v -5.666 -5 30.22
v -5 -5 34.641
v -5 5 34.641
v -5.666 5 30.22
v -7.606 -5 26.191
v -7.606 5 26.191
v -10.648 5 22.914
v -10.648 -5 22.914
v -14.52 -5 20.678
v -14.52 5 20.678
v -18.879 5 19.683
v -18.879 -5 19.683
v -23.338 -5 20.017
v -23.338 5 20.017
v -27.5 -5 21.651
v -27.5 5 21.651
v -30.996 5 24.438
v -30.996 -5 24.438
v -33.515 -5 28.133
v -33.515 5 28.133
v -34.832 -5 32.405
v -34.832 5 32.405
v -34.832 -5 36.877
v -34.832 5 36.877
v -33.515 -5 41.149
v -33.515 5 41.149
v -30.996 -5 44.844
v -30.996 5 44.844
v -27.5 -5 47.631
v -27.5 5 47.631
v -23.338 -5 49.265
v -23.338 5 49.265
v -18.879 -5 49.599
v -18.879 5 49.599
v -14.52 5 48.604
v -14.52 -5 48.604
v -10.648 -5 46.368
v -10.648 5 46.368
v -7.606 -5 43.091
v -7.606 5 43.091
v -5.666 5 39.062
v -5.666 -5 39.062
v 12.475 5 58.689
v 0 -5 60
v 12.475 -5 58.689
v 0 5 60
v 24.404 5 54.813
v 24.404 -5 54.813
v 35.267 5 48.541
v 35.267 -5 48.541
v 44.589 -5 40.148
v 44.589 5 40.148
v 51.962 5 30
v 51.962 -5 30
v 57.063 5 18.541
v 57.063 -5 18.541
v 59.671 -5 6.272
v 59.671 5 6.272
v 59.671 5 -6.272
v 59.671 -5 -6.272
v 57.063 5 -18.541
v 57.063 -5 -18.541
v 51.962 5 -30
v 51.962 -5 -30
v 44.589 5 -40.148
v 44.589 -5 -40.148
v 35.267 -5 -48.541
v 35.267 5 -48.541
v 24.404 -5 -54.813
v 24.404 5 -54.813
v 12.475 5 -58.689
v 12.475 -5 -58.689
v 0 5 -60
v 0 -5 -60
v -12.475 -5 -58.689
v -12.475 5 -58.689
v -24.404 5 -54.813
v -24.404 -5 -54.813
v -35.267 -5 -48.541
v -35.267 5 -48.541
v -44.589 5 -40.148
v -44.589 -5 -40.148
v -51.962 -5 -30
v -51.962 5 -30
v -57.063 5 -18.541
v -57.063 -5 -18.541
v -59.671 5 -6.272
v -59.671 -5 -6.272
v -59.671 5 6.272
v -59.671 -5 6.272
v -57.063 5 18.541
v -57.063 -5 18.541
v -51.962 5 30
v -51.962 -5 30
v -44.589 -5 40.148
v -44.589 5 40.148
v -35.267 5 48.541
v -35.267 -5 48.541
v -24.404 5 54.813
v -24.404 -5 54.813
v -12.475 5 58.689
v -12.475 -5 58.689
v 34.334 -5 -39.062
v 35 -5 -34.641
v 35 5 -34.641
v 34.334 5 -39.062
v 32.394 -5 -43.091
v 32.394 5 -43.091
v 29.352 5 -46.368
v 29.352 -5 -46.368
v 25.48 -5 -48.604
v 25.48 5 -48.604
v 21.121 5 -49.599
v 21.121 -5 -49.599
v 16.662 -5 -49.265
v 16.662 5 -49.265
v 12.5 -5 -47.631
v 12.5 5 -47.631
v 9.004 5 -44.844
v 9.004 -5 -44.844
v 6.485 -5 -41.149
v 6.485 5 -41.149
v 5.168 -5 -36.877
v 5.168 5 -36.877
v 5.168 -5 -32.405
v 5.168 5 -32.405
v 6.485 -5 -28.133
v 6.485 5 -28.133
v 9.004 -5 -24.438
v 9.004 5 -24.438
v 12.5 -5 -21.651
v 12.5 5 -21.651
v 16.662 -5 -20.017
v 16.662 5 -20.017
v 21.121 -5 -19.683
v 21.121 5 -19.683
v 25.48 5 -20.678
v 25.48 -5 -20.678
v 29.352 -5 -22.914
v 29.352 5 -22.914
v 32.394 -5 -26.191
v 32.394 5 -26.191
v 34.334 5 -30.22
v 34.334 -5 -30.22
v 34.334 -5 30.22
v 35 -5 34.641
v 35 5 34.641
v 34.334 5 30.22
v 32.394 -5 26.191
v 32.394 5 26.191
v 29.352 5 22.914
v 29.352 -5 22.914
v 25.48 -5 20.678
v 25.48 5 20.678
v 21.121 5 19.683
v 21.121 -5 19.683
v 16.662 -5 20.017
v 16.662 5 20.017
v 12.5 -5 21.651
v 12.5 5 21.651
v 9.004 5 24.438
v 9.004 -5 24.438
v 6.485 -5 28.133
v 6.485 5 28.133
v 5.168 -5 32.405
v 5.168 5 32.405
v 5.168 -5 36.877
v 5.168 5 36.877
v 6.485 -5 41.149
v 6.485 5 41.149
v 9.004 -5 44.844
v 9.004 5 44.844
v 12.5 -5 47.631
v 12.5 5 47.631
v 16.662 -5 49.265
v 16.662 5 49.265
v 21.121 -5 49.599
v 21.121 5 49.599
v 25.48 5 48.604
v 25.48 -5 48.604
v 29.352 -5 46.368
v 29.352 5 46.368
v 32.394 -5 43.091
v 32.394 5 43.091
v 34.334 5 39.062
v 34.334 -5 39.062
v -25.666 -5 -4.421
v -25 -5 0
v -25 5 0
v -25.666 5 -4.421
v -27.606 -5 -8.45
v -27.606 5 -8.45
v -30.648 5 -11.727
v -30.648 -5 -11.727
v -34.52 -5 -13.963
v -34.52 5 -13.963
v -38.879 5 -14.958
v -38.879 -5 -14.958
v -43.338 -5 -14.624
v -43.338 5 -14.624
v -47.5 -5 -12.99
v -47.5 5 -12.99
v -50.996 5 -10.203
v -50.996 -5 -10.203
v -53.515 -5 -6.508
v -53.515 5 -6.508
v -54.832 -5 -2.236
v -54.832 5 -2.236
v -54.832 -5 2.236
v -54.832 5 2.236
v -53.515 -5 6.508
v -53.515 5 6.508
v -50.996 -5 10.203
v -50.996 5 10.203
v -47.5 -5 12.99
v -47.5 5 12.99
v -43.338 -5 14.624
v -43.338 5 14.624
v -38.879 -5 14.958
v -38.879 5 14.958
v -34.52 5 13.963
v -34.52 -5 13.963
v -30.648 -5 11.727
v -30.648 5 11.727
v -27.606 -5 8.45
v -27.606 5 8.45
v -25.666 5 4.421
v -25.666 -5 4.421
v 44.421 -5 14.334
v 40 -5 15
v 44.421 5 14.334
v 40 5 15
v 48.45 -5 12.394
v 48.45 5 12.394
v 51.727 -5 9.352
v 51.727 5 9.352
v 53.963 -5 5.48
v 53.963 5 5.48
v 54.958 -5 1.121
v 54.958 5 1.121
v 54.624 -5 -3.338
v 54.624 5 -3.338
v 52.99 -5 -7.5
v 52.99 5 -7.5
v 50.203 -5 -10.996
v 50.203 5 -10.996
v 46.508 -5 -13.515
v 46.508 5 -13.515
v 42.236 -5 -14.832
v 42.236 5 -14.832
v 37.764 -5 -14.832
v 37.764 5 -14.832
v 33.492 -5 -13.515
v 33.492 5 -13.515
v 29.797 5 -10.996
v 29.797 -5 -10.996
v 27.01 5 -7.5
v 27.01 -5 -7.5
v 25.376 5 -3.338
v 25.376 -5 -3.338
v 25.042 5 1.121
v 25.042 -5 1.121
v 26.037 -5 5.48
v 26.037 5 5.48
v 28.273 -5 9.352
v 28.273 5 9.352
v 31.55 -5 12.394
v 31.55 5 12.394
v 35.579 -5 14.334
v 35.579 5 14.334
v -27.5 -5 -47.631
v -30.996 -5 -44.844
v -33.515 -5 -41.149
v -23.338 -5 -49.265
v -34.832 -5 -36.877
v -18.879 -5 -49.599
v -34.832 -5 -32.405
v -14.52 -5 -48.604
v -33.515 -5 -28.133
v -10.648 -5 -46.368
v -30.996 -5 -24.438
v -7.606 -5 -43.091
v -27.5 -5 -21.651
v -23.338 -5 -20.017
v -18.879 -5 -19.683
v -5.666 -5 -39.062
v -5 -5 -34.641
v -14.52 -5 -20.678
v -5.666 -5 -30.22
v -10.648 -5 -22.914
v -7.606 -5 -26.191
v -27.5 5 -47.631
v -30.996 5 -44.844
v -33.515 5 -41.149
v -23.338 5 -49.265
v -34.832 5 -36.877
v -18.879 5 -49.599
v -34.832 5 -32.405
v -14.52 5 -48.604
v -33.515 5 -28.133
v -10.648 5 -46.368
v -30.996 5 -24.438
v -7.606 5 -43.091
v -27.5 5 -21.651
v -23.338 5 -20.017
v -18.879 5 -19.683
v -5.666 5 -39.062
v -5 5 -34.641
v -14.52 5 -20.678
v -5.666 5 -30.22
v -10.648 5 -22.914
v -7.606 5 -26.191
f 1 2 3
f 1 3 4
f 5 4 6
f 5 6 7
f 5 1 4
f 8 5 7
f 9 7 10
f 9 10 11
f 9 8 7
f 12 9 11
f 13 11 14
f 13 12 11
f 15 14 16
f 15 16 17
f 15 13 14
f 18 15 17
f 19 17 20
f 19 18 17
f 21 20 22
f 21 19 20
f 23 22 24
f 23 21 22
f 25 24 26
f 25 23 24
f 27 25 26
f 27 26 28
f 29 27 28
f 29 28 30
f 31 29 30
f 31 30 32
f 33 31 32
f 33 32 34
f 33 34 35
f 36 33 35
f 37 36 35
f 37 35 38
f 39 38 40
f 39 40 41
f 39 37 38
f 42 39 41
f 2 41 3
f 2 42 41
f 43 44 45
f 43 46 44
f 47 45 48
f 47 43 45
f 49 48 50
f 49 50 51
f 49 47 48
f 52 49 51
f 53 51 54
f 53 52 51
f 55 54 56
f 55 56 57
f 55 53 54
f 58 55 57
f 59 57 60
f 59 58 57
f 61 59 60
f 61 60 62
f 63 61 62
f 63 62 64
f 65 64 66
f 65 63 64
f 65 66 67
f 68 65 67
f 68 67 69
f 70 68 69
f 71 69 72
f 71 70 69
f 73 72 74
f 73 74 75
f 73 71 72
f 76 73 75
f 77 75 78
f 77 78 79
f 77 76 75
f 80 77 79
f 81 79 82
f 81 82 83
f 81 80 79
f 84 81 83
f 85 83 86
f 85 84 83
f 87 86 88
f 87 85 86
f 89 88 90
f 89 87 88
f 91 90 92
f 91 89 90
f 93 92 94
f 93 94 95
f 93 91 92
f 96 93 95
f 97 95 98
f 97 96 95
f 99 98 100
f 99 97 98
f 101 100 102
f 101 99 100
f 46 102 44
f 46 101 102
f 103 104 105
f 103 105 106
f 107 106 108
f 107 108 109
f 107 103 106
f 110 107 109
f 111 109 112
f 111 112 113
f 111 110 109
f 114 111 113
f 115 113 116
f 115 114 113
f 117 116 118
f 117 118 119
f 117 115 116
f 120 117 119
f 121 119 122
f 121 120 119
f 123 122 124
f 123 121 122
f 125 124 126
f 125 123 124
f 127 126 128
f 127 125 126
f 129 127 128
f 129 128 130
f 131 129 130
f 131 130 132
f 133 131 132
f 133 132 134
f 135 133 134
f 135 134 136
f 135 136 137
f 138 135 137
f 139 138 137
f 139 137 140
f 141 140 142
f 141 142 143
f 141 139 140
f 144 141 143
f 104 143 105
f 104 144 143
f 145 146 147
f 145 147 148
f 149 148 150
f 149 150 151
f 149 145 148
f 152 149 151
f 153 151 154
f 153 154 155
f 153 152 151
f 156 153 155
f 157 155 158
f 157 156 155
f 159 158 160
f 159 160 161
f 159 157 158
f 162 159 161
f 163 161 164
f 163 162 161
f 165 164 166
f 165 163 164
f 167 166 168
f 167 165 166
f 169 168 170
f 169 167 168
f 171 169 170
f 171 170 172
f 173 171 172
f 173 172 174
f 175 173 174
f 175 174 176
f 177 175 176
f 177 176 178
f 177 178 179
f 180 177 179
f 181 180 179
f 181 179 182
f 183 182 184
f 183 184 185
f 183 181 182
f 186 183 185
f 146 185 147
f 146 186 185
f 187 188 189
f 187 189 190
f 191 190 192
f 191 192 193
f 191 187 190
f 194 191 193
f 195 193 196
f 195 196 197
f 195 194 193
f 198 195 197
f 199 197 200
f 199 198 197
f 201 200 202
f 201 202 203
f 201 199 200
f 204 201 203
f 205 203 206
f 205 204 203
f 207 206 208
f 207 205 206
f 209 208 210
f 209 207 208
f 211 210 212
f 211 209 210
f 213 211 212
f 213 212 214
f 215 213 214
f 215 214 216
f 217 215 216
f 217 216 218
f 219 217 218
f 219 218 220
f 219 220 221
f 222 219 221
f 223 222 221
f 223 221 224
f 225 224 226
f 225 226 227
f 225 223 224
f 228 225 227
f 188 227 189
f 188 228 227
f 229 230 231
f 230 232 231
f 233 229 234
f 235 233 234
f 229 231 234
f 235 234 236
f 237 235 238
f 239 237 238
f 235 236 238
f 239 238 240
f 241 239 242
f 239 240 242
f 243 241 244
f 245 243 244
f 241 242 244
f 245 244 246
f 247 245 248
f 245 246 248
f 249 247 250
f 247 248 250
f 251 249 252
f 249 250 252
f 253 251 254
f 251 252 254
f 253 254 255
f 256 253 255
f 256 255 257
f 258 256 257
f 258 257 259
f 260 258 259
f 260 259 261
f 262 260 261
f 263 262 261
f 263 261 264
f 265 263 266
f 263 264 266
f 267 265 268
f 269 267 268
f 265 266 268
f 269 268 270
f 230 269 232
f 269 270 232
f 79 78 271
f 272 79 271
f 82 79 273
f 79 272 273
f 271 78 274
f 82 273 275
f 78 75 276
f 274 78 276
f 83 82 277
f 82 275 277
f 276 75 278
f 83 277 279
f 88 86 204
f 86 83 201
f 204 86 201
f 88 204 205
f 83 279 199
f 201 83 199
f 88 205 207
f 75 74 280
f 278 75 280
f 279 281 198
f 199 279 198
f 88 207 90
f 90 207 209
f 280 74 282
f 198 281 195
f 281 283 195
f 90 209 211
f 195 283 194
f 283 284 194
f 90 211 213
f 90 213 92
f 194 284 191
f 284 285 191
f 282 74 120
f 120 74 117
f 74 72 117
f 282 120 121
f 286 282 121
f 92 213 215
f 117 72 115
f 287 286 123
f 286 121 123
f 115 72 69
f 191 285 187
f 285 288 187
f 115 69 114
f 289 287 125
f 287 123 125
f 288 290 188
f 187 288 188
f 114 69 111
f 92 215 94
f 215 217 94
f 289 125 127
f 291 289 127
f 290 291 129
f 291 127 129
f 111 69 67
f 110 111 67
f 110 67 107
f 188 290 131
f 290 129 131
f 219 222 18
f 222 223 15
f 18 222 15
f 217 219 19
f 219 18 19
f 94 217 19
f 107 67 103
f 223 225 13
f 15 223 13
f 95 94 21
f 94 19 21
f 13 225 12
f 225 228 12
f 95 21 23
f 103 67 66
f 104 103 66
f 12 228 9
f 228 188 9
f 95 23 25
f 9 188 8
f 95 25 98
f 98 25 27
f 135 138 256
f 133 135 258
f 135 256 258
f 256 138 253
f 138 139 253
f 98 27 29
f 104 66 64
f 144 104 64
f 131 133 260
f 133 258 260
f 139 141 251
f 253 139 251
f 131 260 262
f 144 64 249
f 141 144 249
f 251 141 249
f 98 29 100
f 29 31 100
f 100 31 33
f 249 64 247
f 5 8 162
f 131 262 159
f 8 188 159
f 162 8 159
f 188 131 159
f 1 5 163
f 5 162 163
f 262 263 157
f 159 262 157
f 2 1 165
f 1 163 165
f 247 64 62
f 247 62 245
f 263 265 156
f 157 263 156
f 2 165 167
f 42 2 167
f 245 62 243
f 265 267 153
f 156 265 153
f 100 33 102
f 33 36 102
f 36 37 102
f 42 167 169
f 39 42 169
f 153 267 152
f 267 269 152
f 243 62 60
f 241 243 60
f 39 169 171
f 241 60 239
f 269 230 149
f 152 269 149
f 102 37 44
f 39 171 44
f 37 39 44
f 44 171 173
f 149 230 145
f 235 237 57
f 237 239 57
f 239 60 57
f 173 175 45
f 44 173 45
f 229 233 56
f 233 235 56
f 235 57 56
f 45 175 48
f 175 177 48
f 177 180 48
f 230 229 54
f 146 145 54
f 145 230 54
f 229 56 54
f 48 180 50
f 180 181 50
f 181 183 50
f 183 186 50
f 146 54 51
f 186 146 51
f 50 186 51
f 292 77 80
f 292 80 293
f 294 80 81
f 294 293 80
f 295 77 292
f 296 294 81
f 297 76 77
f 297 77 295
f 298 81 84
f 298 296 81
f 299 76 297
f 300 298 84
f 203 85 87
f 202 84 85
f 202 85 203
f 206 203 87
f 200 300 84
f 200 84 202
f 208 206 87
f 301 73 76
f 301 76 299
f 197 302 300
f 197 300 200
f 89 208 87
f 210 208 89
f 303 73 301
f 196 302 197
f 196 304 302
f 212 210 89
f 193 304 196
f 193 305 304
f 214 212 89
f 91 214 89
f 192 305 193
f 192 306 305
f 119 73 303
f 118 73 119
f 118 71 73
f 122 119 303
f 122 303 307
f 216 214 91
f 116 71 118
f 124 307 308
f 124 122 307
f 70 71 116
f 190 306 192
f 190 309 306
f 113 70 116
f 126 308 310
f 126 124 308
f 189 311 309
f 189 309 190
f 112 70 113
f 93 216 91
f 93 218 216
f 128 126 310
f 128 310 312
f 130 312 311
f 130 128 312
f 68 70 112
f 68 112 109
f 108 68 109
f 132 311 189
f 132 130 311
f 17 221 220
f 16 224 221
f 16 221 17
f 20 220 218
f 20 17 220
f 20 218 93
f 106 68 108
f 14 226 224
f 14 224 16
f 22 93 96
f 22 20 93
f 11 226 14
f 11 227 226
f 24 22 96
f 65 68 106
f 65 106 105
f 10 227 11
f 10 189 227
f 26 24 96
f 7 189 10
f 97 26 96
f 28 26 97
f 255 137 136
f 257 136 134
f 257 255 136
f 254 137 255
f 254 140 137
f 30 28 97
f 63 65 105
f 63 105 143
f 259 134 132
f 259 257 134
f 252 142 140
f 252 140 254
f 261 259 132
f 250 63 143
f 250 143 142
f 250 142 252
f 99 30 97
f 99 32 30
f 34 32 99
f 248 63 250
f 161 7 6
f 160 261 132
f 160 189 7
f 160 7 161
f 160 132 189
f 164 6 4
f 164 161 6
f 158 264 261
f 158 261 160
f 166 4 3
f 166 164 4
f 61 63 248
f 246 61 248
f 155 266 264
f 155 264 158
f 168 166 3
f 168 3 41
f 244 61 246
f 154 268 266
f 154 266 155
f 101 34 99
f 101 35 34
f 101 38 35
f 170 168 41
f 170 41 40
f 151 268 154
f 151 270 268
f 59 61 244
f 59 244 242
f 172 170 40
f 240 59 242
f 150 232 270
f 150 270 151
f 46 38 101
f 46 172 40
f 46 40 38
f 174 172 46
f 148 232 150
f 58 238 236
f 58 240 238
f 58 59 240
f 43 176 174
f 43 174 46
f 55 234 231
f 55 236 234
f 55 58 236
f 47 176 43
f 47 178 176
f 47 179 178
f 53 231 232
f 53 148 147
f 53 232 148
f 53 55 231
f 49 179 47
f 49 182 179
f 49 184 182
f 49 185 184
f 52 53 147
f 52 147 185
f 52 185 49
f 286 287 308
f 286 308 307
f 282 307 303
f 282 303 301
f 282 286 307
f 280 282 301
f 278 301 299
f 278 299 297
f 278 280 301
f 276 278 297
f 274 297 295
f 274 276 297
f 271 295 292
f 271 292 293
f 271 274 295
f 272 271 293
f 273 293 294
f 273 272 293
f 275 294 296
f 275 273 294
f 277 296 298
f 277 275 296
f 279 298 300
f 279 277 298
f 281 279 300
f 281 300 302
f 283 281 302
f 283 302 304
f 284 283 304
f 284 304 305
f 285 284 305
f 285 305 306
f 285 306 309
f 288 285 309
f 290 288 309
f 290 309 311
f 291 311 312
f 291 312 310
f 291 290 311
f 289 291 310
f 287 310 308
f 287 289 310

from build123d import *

# Parameters (mm, degrees)
ESQUISSE1_R                      = 60
BOSS_EXTRU_1_DEPTH               = 5
ESQUISSE2_R                      = 15
ENL_V_MAT_EXTRU_1_DEPTH          = 86
R_P_TITION_START                 = -5
R_P_TITION_CIRCULAIRE1_OUTLINE_R = 15
R_P_TITION_CIRCULAIRE1_DEPTH     = 10


# Read off the part's stored shape, not the designer's step: Répétition circulaire1
with BuildPart() as part:
    # Esquisse1 → Boss.-Extru.1 (new, symmetric)
    with BuildSketch(Plane(origin=(0, 0, 0), x_dir=(1, 0, 0), z_dir=(0, 1, 0))):
        with Locations(Location((0, 0, 0), (0, 0, 270))):
            Circle(ESQUISSE1_R)
    extrude(amount=BOSS_EXTRU_1_DEPTH, both=True)

    # Esquisse2 → Enlèv. mat.-Extru.1 (cut, symmetric)
    with BuildSketch(Plane(origin=(0, 0, 0), x_dir=(1, 0, 0), z_dir=(0, 1, 0))):
        with Locations(Location((40, 0, 0), (0, 0, 270))):
            Circle(ESQUISSE2_R)
    extrude(amount=ENL_V_MAT_EXTRU_1_DEPTH, both=True, mode=Mode.SUBTRACT)

    # Répétition circulaire1 outline → Répétition circulaire1 (cut)
    with BuildSketch(Plane(origin=(0, 0, 0), x_dir=(1, 0, 0), z_dir=(0, 1, 0)).offset(R_P_TITION_START)):
        with Locations((20, 34.641016151)):
            Circle(R_P_TITION_CIRCULAIRE1_OUTLINE_R)
        with Locations((-20, 34.641016151)):
            Circle(R_P_TITION_CIRCULAIRE1_OUTLINE_R)
        with Locations((-40, 0)):
            Circle(R_P_TITION_CIRCULAIRE1_OUTLINE_R)
        with Locations((-20, -34.641016151)):
            Circle(R_P_TITION_CIRCULAIRE1_OUTLINE_R)
        with Locations((20, -34.641016151)):
            Circle(R_P_TITION_CIRCULAIRE1_OUTLINE_R)
    extrude(amount=R_P_TITION_CIRCULAIRE1_DEPTH, mode=Mode.SUBTRACT)


solid = part.part
